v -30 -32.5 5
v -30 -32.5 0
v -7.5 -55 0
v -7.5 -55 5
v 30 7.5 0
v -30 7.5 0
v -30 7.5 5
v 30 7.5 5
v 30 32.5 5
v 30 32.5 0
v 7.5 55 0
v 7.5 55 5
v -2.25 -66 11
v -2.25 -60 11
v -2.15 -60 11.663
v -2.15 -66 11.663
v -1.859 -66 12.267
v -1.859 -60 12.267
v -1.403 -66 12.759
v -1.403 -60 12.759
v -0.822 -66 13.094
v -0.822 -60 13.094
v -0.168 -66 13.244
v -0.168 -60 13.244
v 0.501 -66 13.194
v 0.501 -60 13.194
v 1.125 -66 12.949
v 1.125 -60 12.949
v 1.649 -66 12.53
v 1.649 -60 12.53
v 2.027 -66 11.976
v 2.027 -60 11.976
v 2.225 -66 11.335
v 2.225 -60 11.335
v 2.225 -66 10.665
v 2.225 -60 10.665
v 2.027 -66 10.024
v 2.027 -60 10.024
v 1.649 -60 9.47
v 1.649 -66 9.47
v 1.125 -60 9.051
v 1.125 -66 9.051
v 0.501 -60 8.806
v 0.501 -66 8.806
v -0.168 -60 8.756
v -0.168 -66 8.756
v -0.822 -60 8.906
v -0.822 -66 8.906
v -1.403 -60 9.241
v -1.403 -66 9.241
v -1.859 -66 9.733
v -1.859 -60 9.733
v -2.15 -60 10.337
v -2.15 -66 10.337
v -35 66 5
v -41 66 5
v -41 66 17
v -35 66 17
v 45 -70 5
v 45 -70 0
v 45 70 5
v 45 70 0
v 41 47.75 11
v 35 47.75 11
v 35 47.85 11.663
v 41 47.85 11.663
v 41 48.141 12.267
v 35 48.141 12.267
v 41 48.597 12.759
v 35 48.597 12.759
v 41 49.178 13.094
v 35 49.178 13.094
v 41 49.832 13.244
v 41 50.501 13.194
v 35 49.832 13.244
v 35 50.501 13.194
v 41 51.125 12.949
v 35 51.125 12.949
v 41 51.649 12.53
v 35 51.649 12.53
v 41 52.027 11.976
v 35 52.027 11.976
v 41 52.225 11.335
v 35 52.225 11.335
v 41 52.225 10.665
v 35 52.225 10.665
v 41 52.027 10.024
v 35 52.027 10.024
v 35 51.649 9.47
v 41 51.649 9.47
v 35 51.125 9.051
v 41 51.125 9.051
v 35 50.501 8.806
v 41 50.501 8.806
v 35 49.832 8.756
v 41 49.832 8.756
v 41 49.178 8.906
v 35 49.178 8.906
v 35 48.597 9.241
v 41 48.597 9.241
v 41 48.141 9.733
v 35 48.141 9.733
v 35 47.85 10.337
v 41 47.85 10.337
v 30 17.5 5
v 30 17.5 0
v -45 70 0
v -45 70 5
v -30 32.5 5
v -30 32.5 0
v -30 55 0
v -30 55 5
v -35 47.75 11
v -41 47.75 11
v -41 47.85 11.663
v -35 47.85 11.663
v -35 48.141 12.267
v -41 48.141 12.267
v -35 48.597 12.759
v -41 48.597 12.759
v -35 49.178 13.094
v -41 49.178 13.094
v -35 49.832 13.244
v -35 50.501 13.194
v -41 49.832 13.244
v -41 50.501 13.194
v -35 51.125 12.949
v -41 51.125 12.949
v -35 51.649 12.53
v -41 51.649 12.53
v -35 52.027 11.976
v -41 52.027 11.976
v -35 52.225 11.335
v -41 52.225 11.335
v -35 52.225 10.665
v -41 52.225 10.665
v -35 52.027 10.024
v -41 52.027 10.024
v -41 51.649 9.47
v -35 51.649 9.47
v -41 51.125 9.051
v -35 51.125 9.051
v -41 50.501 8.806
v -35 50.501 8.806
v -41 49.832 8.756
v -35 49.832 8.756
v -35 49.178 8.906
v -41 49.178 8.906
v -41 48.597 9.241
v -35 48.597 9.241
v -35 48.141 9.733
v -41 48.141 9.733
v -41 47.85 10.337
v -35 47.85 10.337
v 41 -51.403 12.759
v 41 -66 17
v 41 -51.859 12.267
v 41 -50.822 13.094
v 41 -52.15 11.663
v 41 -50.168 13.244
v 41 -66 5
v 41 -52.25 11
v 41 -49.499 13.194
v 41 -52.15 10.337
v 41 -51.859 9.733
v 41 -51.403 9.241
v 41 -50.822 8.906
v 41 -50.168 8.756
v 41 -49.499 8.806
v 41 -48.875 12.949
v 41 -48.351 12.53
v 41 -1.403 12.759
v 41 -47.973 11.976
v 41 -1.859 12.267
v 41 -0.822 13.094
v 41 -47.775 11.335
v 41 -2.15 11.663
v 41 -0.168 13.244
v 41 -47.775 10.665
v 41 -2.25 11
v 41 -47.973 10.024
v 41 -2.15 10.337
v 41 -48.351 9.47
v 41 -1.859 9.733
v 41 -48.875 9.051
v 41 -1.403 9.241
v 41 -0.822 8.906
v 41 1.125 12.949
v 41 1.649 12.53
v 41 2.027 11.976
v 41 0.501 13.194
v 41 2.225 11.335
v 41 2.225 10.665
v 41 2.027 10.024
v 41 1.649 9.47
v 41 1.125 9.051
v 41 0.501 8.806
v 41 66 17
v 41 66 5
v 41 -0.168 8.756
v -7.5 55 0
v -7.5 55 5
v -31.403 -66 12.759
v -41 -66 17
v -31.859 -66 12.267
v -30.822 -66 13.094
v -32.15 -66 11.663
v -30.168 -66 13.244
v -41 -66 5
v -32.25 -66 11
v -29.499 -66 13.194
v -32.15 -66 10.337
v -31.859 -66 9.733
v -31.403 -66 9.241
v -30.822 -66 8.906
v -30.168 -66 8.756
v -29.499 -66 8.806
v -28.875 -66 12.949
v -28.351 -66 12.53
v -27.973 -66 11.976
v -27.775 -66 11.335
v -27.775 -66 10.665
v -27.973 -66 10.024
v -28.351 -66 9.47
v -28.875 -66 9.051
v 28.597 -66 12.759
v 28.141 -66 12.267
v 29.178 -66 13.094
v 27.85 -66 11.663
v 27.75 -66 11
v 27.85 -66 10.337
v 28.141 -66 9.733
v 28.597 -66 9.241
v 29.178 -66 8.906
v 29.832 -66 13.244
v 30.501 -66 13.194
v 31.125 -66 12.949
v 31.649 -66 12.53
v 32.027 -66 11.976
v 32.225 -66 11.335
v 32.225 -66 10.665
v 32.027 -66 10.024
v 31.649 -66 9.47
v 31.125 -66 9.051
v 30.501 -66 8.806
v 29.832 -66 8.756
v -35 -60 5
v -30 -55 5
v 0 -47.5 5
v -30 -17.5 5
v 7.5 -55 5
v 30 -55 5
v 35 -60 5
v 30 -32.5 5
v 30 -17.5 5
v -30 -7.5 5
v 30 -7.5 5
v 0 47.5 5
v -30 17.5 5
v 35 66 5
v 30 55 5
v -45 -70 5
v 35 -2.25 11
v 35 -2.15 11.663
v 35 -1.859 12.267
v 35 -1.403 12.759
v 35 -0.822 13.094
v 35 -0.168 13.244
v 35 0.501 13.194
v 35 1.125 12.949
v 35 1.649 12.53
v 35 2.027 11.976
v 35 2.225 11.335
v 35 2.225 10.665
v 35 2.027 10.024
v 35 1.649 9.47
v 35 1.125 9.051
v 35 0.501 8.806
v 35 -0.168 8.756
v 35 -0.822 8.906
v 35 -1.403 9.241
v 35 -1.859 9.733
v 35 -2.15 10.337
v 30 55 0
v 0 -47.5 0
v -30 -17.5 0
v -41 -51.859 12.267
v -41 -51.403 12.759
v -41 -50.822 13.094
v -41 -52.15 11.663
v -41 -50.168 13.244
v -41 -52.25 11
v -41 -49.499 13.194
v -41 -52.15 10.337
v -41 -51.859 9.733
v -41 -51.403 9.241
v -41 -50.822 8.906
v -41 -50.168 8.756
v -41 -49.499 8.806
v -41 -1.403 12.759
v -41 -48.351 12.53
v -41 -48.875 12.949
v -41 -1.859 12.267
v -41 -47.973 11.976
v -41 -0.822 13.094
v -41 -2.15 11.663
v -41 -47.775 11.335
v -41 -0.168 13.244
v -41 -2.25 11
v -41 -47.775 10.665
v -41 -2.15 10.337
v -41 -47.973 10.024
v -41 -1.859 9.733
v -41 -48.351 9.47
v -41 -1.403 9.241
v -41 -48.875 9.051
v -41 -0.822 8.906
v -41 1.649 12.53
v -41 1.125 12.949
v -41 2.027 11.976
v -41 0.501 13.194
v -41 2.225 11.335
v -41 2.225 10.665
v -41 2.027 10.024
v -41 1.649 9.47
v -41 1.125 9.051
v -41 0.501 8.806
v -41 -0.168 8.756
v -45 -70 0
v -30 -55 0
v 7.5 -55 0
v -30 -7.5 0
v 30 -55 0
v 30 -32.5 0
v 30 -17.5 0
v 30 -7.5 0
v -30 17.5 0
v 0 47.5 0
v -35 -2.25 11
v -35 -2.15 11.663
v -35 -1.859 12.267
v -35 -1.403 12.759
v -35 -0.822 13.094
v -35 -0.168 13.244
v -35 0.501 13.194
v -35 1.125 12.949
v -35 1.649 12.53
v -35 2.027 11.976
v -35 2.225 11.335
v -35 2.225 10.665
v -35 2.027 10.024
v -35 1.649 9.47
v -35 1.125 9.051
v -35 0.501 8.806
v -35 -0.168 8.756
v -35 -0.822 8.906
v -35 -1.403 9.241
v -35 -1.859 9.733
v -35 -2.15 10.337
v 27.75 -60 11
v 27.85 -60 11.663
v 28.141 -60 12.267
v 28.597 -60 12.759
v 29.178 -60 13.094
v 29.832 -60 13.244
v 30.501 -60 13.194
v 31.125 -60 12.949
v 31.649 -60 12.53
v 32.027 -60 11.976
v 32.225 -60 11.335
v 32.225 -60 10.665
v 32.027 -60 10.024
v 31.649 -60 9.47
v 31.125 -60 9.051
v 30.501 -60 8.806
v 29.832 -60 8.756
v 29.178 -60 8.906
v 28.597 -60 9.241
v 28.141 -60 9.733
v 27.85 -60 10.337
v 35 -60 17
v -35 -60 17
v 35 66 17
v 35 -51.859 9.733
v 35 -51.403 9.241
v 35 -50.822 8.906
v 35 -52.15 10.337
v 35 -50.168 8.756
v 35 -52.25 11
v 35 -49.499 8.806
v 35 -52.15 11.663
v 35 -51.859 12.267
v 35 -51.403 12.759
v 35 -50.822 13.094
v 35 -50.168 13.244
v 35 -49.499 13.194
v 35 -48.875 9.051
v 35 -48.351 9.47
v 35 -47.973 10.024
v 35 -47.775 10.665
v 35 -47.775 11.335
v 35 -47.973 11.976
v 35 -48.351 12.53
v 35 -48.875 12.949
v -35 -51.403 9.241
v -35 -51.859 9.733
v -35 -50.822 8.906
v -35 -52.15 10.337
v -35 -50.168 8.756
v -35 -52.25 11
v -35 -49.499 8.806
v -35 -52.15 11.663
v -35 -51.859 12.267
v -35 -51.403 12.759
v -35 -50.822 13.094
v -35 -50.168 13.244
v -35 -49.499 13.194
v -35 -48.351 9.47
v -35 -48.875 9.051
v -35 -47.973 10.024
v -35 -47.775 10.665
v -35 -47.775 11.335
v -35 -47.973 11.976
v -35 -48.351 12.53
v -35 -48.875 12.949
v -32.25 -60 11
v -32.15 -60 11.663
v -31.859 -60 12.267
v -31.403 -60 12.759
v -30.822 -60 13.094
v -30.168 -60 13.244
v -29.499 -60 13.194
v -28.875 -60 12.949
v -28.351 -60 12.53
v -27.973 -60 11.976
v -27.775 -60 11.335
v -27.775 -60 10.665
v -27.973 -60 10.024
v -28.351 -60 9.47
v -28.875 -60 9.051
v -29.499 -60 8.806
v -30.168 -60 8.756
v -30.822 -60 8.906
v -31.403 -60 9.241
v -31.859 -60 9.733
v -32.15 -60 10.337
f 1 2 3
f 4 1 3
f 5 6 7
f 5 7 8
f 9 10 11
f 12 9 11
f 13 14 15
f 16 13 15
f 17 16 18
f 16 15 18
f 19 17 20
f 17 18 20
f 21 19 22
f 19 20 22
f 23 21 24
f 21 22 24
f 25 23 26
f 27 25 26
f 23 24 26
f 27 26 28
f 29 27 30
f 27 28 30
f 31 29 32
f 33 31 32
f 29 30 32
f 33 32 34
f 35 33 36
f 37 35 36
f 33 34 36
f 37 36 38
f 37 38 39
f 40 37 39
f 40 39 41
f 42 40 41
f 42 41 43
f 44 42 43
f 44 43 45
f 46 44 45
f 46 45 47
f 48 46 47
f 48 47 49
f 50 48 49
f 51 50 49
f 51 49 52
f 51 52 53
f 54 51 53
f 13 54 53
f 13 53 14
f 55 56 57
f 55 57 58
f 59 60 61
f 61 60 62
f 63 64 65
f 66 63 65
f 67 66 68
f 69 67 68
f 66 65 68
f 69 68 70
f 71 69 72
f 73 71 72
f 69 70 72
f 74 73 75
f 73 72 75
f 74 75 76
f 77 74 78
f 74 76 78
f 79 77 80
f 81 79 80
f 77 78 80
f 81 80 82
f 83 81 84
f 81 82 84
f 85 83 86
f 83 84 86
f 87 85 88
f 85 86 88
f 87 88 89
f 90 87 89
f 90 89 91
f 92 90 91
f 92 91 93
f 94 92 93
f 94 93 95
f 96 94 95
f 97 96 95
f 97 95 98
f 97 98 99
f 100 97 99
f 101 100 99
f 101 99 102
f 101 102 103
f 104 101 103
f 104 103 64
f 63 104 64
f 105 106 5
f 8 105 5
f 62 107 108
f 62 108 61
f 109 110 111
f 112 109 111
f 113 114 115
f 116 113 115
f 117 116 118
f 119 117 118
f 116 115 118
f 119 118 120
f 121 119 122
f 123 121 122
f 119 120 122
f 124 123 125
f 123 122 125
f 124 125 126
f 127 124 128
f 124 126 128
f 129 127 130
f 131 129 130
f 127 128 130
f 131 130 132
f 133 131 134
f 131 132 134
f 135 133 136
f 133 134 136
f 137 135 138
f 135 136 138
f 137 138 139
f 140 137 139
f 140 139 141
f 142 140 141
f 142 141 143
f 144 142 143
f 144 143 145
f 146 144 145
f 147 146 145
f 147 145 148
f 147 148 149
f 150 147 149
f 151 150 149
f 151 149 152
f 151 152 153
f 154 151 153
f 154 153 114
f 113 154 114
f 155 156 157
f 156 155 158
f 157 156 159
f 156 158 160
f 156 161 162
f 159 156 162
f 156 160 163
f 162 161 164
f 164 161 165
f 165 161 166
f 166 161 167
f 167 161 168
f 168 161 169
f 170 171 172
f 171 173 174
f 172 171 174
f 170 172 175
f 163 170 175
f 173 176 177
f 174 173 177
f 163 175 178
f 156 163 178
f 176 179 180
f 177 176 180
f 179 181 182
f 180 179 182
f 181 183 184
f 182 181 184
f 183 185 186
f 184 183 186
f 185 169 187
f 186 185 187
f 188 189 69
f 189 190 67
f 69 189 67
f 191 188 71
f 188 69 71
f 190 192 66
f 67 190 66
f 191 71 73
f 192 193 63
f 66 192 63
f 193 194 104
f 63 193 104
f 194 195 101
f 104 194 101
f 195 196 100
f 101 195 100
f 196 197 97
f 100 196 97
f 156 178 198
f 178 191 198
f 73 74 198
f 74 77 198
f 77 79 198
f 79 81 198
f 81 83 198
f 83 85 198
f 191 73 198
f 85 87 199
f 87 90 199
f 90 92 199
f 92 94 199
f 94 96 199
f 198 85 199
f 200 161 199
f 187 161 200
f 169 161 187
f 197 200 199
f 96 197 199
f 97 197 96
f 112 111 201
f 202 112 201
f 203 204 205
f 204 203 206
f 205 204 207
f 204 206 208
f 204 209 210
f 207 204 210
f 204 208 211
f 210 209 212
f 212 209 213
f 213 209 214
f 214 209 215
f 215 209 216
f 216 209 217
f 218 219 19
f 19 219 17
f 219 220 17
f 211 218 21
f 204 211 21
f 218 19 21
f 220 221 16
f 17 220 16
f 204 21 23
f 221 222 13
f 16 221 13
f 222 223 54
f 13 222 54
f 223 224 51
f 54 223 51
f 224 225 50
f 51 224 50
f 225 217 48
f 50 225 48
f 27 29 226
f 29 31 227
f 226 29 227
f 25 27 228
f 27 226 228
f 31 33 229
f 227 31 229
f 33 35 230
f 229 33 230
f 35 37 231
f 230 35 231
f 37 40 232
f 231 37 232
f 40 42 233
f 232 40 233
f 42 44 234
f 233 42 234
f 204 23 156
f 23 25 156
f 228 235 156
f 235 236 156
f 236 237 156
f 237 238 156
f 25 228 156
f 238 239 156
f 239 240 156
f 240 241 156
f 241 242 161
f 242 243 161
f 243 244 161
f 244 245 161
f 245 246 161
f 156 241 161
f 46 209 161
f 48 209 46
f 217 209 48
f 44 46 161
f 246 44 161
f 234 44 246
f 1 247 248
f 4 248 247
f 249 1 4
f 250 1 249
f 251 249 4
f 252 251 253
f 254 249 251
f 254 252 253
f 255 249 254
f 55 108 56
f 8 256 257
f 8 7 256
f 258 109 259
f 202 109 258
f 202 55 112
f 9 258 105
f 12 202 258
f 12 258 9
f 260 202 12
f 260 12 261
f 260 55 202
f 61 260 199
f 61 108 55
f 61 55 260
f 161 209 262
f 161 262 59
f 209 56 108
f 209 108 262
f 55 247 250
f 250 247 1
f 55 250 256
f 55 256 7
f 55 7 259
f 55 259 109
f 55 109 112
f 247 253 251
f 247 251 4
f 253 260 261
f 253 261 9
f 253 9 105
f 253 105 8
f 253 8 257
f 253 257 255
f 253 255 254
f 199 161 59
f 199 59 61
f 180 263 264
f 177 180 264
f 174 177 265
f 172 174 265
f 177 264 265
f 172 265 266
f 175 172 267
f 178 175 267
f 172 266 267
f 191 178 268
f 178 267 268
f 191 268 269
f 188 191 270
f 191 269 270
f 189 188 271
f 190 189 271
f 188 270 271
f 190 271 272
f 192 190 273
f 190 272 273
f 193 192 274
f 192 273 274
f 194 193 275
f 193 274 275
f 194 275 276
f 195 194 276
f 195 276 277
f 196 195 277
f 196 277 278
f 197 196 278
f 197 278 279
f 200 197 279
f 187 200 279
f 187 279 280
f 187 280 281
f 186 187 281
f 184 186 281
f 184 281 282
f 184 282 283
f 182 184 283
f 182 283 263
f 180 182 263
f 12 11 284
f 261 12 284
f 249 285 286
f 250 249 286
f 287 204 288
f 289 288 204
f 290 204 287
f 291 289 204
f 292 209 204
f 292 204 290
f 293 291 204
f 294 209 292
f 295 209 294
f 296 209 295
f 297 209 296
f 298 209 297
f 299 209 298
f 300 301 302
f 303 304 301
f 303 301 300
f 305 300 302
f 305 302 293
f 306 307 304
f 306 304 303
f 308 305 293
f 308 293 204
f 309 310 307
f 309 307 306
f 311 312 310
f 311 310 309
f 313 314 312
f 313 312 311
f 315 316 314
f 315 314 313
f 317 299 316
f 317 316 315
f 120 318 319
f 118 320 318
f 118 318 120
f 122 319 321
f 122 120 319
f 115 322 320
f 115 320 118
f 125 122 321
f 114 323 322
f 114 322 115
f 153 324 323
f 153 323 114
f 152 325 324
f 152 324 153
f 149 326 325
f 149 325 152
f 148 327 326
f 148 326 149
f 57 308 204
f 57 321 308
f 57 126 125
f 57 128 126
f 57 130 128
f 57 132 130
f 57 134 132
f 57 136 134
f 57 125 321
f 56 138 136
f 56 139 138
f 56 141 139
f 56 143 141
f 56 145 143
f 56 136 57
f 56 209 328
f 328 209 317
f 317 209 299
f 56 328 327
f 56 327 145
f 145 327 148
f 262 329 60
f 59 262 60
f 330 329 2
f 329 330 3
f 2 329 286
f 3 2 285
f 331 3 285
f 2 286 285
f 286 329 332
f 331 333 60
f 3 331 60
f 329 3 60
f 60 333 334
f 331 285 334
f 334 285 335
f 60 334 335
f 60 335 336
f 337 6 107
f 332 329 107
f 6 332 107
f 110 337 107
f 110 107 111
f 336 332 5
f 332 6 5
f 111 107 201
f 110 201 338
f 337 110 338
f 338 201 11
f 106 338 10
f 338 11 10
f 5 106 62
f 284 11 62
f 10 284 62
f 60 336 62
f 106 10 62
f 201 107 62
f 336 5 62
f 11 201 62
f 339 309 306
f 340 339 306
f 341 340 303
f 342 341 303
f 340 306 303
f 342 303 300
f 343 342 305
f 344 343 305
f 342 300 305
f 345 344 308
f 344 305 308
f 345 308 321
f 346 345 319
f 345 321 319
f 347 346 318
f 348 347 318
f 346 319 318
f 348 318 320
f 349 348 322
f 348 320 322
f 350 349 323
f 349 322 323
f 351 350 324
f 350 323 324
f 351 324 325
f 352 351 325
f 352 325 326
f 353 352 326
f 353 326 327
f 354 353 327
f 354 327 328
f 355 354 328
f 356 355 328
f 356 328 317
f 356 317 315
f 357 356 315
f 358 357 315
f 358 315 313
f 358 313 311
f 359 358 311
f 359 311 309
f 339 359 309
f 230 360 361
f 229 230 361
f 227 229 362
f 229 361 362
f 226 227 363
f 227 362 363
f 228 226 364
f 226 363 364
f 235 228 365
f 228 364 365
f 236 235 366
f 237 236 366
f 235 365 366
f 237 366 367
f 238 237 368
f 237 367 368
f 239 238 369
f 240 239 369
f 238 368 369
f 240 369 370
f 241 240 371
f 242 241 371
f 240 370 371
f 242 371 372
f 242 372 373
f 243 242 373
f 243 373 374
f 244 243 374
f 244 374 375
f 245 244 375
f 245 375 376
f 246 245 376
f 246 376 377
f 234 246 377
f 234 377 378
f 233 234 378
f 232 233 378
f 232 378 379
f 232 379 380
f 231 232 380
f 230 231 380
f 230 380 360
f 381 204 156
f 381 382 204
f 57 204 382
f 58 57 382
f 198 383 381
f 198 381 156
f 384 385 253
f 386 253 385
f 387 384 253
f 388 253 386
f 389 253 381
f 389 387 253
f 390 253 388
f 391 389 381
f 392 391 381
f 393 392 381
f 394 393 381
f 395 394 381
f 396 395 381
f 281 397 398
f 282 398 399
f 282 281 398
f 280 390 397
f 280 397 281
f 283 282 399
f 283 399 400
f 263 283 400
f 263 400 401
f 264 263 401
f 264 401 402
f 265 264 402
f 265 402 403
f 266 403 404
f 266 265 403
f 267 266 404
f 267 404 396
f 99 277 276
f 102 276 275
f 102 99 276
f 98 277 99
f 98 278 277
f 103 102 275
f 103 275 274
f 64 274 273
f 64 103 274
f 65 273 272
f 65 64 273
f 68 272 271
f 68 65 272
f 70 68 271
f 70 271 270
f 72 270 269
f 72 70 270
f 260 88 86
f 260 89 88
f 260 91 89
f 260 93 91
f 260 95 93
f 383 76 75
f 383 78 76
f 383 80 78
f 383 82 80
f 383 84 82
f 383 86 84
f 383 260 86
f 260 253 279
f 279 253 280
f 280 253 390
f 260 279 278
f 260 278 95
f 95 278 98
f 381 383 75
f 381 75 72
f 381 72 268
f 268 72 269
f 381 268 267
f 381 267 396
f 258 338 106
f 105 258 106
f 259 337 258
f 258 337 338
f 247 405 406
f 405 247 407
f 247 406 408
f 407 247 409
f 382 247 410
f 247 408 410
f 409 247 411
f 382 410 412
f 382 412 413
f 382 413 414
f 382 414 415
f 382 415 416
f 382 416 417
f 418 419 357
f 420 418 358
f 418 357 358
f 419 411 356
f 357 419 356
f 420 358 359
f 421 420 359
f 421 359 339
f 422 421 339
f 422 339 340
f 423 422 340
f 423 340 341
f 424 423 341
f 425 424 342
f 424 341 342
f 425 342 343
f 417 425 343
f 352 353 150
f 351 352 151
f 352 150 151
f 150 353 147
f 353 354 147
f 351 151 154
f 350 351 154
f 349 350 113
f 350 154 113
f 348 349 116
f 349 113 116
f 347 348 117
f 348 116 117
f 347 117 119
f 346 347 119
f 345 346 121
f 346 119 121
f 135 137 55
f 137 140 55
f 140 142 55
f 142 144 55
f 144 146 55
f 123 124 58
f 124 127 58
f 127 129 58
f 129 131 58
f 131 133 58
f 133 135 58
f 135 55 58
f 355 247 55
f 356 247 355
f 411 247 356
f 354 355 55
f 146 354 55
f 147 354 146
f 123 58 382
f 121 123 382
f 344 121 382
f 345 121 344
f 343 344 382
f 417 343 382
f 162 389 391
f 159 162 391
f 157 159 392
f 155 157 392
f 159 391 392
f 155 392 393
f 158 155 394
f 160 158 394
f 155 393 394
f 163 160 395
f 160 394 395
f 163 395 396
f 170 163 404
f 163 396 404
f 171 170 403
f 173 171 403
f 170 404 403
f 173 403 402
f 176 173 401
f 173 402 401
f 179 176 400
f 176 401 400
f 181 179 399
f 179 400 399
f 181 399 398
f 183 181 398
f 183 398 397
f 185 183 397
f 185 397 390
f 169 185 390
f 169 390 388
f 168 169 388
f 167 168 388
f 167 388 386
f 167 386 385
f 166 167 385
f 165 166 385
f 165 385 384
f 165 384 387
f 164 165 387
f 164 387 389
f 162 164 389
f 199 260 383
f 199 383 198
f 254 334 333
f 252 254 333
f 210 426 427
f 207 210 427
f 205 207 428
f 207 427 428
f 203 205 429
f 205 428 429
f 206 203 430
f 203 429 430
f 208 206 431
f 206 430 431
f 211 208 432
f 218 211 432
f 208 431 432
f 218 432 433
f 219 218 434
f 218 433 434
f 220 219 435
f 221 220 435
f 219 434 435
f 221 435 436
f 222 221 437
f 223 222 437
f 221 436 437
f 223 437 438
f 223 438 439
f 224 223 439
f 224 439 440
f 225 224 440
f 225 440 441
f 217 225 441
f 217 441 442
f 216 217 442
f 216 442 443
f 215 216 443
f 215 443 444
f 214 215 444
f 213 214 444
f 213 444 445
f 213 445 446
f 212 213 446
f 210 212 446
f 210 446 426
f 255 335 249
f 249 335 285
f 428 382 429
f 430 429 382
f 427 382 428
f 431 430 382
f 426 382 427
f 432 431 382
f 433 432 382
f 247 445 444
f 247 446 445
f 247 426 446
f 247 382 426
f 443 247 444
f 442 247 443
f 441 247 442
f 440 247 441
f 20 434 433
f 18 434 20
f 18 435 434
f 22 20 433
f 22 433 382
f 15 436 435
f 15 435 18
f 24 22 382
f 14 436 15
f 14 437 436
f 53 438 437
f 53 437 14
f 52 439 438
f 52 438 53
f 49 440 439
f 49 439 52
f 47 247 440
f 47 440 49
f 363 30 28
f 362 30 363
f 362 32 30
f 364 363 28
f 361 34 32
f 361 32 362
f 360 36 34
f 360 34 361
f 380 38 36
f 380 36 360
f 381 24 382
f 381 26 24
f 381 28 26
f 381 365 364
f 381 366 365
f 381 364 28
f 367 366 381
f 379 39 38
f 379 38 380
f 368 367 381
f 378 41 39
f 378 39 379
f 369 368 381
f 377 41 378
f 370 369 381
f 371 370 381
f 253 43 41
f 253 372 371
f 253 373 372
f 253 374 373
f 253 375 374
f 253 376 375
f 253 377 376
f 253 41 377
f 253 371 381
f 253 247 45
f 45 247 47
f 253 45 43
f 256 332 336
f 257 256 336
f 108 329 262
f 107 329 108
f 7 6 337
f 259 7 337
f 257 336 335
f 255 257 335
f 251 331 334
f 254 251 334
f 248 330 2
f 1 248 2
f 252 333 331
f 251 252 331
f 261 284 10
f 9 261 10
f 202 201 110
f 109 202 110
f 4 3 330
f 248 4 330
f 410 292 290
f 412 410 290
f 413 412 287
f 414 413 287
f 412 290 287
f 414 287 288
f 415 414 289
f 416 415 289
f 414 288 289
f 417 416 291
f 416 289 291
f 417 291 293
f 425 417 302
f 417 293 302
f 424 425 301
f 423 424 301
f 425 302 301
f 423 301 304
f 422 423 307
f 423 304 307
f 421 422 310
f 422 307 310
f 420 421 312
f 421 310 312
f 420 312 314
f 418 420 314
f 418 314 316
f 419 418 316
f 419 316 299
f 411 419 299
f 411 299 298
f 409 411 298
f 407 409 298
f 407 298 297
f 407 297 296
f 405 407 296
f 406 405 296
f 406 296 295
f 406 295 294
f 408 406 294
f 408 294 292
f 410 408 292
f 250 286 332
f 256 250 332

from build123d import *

# Parameters (mm, degrees)
F0_W     = 90
F0_H     = 140
F0_W_2   = 60
F0_H_2   = 15
F1_DEPTH = 5
F2_W     = 82
F2_H     = 132
F2_W_2   = 70
F2_H_2   = 120
F3_DEPTH = 12
F4_R     = 2.25
F5_DEPTH = 86.001
F6_R     = 2.25
F7_DEPTH = 136.001
F8_W     = 70
F8_H     = 12
F8_R     = 2.25
F9_DEPTH = 6


with BuildPart() as f1:
    # F0 (on Top) → F1 (new body)
    with BuildSketch(Plane.XY):
        Rectangle(F0_W, F0_H)
        Polygon((-30, 32.5), (-30, 55), (-7.5, 55), (7.5, 55), (30, 55), (30, 32.5), (30, 17.5), (30, 7.5), (30, -7.5), (30, -17.5), (30, -32.5), (30, -55), (7.5, -55), (-7.5, -55), (-30, -55), (-30, -32.5), (-30, -17.5), (-30, -7.5), (-30, 7.5), (-30, 17.5), align=None, mode=Mode.SUBTRACT)
        Polygon((7.5, 55), (-7.5, 55), (-30, 32.5), (-30, 17.5), (0, 47.5), (30, 17.5), (30, 32.5), align=None)
        Polygon((0, -47.5), (-30, -17.5), (-30, -32.5), (-7.5, -55), (7.5, -55), (30, -32.5), (30, -17.5), align=None)
        Rectangle(F0_W_2, F0_H_2)
    extrude(amount=F1_DEPTH)

    # F2 (on face) → F3 (join)
    with BuildSketch(Plane.XY.offset(5)):
        Rectangle(F2_W, F2_H)
        Rectangle(F2_W_2, F2_H_2, mode=Mode.SUBTRACT)
    extrude(amount=F3_DEPTH)

    # F4 (on face) → F5 (cut, through all)
    with BuildSketch(Plane(origin=(-41, 0, 0), x_dir=(0, -1, 0), z_dir=(-1, 0, 0))):
        with Locations((-50, 11)):
            Circle(F4_R)
        with Locations((0, 11)):
            Circle(F4_R)
        with Locations((50, 11)):
            Circle(F4_R)
    extrude(amount=-F5_DEPTH, mode=Mode.SUBTRACT)

    # F6 (on face) → F7 (cut, through all)
    with BuildSketch(Plane(origin=(0, 66, 0), x_dir=(-1, 0, 0), z_dir=(0, 1, 0))):
        with Locations((-30, 11)):
            Circle(F6_R)
        with Locations((0, 11)):
            Circle(F6_R)
        with Locations((30, 11)):
            Circle(F6_R)
    extrude(amount=-F7_DEPTH, mode=Mode.SUBTRACT)

    # F8 (on face) → F9 (cut, through all)
    with BuildSketch(Plane(origin=(0, 66, 0), x_dir=(-1, 0, 0), z_dir=(0, 1, 0))):
        with Locations((0, 11)):
            Rectangle(F8_W, F8_H)
        with Locations((-30, 11)):
            Circle(F8_R, mode=Mode.SUBTRACT)
        with Locations((0, 11)):
            Circle(F8_R, mode=Mode.SUBTRACT)
        with Locations((30, 11)):
            Circle(F8_R, mode=Mode.SUBTRACT)
    extrude(amount=-F9_DEPTH, mode=Mode.SUBTRACT)


solid = f1.part
